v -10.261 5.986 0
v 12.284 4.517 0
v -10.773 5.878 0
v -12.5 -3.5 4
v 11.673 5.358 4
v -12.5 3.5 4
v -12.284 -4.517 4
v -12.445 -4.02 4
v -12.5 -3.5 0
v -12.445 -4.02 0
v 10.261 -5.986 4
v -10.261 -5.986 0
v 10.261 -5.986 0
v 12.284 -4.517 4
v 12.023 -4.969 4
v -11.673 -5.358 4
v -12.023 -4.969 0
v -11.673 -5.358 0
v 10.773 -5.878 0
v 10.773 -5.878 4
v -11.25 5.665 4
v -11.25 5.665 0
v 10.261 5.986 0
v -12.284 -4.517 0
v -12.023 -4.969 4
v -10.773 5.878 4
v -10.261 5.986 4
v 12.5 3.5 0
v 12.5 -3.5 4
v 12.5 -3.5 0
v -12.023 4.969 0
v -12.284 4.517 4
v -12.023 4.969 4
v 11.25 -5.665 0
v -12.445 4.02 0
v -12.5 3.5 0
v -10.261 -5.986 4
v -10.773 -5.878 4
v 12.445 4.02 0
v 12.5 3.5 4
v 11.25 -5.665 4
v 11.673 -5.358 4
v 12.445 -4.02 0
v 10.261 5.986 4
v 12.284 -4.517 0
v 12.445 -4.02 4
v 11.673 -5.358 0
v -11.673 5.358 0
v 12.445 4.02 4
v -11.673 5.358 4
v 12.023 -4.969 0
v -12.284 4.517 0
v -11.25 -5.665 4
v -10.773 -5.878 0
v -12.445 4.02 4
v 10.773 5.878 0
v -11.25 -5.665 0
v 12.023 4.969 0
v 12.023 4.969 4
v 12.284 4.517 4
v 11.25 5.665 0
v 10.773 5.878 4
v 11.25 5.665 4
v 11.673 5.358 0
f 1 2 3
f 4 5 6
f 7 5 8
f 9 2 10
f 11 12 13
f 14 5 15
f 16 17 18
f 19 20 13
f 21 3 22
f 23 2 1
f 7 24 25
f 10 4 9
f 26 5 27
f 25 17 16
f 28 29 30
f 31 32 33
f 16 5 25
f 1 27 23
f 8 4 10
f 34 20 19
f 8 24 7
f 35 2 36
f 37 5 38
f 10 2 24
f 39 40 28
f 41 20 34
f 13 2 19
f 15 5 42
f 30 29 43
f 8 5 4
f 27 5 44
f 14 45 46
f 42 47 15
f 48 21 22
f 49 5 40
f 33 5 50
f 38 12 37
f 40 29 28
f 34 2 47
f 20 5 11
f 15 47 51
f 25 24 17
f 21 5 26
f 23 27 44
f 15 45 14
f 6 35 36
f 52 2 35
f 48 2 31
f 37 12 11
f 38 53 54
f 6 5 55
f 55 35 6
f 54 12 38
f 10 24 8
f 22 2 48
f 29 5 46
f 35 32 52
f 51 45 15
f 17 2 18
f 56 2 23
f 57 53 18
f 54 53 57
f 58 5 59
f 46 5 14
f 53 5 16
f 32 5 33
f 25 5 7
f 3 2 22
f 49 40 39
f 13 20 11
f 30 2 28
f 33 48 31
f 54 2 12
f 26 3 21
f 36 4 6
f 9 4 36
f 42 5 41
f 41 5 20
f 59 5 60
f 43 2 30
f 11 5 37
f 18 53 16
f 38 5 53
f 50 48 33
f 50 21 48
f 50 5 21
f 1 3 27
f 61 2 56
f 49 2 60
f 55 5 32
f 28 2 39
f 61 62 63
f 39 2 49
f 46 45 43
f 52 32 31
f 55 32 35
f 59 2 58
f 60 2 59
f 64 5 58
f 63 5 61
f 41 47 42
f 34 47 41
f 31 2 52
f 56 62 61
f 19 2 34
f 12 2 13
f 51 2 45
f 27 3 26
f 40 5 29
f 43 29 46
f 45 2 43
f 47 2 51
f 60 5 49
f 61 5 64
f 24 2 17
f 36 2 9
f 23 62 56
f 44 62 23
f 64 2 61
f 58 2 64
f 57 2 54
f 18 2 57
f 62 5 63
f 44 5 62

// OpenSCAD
$fs = 0.1;
module round_square(x,y,z,r){
    translate([-x/2,-y/2]){
        hull(){
            translate([r/2,r/2,0]) cylinder(h=z,d=r);
            translate([-(r/2)+x,r/2,0]) cylinder(h=z,d=r);
            translate([(r/2),-(r/2)+y,0]) cylinder(h=z,d=r);
            translate([-(r/2)+x,-(r/2)+y,0]) cylinder(h=z,d=r);
        }
    }
}


round_square(25,12,4,5);
